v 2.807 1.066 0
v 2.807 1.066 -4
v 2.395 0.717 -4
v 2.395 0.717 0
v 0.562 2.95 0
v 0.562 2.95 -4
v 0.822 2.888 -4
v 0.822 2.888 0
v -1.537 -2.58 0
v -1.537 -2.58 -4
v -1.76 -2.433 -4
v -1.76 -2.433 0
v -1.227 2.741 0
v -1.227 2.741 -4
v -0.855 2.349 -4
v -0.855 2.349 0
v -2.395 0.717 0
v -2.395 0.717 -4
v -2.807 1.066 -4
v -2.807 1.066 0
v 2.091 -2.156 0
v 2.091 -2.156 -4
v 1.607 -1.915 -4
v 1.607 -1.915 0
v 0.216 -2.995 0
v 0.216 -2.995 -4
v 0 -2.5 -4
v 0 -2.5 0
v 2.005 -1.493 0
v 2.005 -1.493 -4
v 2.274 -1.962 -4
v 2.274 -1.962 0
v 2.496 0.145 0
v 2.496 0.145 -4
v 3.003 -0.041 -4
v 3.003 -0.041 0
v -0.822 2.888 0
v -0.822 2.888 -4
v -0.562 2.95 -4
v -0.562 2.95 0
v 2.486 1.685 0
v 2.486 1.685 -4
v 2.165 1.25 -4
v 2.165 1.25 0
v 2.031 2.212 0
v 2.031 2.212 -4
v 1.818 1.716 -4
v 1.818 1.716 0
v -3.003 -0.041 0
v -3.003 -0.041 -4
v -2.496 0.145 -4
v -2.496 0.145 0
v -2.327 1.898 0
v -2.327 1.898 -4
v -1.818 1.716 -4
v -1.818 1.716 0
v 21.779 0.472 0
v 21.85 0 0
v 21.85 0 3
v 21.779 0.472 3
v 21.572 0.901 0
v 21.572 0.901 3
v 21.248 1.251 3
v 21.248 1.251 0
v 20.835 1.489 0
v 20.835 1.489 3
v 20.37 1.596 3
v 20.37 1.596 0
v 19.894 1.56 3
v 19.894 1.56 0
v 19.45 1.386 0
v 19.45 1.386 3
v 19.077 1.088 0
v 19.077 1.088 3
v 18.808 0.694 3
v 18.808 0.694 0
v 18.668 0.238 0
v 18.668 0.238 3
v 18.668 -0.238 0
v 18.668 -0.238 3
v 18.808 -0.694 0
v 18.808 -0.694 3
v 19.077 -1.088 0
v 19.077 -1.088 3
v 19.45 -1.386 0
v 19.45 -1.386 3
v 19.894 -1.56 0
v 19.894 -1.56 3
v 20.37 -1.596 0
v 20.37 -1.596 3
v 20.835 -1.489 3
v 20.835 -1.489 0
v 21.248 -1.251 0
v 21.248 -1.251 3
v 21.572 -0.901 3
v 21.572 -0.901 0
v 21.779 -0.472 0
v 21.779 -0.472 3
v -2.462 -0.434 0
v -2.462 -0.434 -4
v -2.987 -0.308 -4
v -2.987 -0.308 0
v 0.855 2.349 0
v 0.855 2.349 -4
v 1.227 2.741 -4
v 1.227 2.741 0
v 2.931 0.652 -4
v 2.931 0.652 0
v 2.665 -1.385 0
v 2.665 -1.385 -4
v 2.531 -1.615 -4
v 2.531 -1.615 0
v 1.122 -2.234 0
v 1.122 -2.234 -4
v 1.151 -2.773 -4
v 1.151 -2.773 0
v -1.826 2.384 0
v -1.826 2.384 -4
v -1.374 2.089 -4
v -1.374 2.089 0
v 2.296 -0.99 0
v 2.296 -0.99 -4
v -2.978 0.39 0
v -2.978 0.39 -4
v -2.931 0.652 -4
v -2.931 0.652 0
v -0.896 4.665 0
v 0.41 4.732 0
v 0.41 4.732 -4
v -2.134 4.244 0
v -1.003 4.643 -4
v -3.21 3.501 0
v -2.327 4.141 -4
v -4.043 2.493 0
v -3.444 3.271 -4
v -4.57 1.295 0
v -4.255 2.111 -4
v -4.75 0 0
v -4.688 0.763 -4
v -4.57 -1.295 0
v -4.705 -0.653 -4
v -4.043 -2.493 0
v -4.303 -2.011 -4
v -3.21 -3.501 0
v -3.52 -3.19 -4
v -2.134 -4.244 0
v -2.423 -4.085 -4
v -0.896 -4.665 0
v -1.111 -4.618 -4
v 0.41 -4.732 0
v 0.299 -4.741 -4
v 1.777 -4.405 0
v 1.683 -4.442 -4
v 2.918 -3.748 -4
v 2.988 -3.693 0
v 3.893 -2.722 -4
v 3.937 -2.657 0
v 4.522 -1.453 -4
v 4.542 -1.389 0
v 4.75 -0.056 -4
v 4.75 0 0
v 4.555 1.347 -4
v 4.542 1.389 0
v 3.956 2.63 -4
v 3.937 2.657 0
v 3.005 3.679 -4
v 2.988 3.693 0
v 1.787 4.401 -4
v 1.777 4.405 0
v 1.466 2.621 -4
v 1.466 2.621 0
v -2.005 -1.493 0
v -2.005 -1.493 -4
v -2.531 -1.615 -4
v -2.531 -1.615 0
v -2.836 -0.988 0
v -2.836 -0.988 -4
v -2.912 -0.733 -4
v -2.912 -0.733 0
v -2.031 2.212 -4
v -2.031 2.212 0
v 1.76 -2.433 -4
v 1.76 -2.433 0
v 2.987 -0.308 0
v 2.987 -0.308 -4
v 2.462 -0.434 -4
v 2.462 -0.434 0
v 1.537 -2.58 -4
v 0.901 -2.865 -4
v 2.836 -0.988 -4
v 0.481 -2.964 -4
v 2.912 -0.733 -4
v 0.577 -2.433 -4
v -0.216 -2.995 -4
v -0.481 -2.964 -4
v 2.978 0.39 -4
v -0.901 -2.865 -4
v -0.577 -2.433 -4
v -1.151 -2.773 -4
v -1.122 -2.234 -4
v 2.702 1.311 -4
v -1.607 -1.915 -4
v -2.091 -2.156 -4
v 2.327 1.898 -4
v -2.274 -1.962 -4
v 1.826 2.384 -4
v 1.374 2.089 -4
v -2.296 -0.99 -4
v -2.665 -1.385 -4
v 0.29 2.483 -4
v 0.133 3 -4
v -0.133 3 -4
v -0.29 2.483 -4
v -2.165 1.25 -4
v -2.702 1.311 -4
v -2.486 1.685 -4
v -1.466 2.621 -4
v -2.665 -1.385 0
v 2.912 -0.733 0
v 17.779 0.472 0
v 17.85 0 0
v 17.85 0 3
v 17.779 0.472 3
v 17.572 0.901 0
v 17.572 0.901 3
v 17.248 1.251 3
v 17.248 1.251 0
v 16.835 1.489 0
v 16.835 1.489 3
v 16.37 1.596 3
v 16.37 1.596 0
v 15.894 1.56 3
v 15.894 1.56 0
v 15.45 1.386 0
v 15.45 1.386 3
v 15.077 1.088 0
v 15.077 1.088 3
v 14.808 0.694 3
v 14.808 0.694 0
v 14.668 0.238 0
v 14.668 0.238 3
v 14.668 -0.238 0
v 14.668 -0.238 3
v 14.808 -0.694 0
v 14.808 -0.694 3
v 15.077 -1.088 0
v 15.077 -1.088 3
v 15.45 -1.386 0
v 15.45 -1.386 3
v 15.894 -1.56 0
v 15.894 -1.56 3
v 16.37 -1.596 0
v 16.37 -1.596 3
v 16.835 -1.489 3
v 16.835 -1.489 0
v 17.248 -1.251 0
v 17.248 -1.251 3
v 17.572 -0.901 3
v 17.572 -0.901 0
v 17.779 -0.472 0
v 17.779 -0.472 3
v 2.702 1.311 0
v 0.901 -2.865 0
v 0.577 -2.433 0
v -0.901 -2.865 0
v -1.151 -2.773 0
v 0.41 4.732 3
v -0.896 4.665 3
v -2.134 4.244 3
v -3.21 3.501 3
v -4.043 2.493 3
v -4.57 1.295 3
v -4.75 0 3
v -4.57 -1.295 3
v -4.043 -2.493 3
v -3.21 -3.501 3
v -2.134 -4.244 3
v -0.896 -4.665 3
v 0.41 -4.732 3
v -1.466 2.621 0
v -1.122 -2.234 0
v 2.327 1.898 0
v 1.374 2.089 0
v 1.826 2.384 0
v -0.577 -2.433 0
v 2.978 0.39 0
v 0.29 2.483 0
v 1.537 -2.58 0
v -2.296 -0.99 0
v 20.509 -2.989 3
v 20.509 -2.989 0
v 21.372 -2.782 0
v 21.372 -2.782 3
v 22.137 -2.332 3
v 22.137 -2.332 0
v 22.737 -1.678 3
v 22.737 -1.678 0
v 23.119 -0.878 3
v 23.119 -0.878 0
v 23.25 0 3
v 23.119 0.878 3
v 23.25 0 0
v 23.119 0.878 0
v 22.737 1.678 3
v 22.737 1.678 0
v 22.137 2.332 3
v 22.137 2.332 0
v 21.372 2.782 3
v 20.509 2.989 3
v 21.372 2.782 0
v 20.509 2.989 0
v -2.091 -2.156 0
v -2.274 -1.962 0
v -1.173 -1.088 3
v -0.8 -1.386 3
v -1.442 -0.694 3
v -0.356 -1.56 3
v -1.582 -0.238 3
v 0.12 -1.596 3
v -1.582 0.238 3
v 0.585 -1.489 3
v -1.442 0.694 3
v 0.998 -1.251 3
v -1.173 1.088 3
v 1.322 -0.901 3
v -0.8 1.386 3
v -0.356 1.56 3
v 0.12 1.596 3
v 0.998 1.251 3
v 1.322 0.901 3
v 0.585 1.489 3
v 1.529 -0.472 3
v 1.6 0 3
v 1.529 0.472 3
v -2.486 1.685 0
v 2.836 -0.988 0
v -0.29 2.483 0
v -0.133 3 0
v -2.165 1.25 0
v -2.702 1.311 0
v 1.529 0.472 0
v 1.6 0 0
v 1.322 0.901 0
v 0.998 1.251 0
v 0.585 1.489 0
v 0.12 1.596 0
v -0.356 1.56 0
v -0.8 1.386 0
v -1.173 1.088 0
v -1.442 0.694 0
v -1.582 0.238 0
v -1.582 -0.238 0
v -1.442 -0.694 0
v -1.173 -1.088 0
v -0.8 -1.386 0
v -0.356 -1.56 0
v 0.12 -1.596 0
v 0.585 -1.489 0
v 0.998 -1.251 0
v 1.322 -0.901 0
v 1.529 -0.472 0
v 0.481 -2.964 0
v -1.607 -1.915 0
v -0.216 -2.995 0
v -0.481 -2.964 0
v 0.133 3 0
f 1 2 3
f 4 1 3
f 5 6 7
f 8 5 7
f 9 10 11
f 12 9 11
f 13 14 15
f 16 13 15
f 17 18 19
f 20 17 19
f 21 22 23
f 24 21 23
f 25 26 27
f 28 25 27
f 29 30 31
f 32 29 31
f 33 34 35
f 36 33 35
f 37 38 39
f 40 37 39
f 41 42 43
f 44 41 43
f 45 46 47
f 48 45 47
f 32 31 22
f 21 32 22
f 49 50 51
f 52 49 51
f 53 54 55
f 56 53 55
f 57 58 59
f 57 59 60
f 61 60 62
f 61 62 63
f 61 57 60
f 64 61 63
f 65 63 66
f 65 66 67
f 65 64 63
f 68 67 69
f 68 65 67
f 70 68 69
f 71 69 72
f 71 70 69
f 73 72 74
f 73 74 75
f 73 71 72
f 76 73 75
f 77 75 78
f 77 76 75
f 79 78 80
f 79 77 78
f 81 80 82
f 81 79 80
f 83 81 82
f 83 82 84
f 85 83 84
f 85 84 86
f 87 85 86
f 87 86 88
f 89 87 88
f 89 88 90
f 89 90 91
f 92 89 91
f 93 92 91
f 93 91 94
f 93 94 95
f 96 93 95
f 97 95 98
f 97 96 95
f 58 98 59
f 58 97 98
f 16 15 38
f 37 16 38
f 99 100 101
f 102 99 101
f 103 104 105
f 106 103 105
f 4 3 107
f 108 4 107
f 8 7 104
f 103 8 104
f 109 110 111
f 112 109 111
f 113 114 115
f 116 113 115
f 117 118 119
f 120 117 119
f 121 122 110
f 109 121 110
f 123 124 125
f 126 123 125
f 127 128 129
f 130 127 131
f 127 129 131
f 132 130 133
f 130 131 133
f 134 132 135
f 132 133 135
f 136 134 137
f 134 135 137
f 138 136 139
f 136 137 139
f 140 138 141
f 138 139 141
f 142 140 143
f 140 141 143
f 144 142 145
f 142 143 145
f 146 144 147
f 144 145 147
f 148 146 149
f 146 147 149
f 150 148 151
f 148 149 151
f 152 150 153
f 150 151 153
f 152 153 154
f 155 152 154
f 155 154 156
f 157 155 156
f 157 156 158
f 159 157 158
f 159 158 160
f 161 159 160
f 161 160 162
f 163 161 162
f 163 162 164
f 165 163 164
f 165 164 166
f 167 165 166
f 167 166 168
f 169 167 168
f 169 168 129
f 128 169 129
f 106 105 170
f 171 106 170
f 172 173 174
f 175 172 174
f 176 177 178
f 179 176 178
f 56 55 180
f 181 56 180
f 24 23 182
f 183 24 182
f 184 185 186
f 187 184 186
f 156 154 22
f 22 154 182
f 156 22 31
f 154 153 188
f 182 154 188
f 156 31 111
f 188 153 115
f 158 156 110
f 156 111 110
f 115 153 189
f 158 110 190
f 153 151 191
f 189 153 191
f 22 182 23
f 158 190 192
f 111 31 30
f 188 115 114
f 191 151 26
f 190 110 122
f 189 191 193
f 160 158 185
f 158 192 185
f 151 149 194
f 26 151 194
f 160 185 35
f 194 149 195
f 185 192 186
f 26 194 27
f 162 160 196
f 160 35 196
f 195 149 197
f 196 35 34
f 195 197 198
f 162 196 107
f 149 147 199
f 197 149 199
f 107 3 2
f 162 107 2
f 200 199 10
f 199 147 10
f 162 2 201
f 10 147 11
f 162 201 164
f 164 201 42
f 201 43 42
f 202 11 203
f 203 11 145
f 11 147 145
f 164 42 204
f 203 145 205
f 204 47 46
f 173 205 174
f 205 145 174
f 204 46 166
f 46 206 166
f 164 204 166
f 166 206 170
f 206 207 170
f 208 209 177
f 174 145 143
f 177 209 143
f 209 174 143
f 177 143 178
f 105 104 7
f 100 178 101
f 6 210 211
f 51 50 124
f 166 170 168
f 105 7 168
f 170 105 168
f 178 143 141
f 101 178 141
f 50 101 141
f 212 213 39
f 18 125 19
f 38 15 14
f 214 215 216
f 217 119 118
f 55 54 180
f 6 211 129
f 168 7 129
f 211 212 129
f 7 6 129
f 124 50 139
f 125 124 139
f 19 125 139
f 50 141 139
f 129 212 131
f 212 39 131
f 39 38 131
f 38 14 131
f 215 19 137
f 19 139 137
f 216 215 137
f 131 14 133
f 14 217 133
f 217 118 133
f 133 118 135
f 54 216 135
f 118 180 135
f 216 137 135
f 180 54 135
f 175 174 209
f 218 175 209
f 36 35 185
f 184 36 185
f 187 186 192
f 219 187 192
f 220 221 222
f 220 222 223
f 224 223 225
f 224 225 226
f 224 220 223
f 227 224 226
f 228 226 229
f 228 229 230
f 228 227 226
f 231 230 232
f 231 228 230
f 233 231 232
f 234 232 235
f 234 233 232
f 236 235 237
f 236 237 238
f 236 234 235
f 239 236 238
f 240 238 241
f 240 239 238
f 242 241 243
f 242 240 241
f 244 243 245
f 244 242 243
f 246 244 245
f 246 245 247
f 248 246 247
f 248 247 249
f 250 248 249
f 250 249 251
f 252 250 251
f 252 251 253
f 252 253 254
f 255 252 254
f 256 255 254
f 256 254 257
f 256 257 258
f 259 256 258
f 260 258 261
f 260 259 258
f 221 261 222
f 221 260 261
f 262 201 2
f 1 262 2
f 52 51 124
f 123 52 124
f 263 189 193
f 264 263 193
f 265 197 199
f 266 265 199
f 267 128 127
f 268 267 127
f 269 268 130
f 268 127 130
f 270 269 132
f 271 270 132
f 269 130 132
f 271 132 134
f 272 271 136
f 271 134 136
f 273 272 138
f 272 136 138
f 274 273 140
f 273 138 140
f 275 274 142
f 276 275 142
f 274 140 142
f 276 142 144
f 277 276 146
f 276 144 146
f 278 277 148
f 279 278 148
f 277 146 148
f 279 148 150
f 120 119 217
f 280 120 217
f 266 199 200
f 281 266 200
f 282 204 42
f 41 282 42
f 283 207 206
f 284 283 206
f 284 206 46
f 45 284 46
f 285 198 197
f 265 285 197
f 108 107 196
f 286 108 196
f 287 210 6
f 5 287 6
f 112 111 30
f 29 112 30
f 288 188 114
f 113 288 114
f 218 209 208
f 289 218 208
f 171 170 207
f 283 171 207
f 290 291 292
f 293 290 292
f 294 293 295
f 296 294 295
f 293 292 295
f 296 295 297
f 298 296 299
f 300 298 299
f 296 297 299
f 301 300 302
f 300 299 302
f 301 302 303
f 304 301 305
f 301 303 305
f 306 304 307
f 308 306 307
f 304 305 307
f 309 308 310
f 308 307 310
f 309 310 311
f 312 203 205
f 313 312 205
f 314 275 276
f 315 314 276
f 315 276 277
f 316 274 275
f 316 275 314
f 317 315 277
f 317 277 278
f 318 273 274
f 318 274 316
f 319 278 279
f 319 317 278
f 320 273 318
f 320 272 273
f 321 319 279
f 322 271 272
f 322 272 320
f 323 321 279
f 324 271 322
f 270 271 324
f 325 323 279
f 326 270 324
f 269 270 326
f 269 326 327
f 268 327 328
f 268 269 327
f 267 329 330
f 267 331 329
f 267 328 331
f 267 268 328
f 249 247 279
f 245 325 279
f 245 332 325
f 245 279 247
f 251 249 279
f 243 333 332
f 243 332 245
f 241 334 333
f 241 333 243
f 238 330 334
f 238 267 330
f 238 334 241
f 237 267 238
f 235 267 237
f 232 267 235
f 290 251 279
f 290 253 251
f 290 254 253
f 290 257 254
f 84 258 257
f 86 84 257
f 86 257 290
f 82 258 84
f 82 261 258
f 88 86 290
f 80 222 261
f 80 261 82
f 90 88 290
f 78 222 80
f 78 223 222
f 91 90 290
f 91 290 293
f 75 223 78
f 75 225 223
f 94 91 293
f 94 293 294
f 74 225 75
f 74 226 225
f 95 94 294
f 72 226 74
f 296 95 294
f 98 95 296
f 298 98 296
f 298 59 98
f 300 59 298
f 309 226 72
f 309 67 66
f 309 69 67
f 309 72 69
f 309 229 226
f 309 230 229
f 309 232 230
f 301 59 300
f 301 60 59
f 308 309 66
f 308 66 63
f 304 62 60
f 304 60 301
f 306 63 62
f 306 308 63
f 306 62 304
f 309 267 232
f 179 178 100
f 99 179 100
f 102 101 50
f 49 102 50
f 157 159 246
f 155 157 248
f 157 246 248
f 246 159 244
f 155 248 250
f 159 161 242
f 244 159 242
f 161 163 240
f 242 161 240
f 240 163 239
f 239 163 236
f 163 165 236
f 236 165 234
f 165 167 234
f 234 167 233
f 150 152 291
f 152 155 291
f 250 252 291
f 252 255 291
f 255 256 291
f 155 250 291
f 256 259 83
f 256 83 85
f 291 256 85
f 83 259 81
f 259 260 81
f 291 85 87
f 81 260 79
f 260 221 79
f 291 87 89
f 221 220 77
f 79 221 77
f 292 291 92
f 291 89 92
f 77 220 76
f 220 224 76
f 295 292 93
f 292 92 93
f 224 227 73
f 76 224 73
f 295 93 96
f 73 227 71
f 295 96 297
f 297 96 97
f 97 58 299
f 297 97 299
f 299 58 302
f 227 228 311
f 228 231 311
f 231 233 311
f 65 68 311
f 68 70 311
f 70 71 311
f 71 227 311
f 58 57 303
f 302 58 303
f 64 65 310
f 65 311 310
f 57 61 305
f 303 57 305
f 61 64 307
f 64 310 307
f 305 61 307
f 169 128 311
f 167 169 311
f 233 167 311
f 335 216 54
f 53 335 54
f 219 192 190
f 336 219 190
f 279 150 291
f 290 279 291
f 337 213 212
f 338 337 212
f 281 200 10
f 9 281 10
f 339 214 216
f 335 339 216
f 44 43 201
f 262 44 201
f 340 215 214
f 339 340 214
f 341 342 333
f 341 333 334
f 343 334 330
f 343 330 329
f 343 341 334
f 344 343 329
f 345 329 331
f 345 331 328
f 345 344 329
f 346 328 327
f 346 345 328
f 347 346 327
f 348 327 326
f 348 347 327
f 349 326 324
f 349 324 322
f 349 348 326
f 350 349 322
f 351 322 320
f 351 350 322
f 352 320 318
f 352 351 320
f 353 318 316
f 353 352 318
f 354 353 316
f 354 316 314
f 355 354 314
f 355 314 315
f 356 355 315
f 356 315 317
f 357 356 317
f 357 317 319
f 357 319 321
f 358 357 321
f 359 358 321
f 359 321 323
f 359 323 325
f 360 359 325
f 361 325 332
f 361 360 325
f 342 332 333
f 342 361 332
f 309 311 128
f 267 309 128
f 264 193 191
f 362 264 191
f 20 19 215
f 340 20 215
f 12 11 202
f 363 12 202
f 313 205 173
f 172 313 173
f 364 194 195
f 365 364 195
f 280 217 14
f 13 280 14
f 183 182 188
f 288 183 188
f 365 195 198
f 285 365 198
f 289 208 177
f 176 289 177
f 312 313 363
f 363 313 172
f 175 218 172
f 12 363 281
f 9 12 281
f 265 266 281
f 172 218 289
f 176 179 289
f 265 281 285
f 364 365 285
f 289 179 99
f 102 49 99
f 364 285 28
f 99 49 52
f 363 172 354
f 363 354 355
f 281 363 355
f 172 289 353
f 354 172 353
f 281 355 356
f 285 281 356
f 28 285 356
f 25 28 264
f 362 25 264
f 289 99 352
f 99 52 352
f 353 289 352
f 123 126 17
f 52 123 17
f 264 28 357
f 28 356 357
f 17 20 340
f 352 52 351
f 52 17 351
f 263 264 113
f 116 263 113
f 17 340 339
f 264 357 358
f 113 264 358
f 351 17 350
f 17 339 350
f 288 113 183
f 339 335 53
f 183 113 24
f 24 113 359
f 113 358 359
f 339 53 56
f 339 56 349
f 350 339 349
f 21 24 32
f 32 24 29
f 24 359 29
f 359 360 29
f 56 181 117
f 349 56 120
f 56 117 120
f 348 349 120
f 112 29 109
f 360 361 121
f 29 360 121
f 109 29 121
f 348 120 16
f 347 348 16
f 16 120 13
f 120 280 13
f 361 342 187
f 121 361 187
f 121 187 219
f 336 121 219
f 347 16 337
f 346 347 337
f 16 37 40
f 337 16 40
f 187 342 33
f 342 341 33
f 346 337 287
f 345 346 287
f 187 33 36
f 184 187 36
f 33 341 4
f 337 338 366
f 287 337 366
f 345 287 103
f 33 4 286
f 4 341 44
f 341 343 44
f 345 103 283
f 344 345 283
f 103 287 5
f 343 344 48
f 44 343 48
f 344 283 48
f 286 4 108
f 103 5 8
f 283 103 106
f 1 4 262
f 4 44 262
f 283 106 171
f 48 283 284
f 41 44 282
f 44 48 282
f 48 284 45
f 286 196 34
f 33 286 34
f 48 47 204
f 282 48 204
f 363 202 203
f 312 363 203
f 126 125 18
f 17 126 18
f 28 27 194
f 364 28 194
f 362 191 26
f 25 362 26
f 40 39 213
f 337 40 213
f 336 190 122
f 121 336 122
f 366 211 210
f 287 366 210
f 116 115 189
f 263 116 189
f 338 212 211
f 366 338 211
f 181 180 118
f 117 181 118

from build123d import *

# Parameters (mm, degrees)
SKETCH1_R           = 1.6
SKETCH1_R_2         = 2.5
BOSS_EXTRUDE1_DEPTH = 3
BOSS_EXTRUDE2_START = -4
SKETCH1_3_R         = 4.75
SKETCH1_3_R_2       = 2.5
BOSS_EXTRUDE2_DEPTH = 4
CUT_EXTRUDE1_DEPTH  = 4
BOSS_EXTRUDE3_START = -3
SKETCH3_R           = 2.5
SKETCH3_R_2         = 1.6
BOSS_EXTRUDE3_DEPTH = 3


with BuildPart() as part:
    # Sketch1 → Boss-Extrude1 (new body)
    with BuildSketch(Plane.XY):
        with BuildLine():
            Line((20.509259259, 2.988776445), (0.410493827, 4.732229371))
            ThreePointArc((0.410493827, 4.732229371), (-4.75, 0), (0.410493827, -4.732229371))
            Line((0.410493827, -4.732229371), (20.509259259, -2.988776445))
            ThreePointArc((20.509259259, -2.988776445), (23.25, 0), (20.509259259, 2.988776445))
        make_face()
        with Locations((16.25, 0)):
            Circle(SKETCH1_R, mode=Mode.SUBTRACT)
        Circle(SKETCH1_R_2, mode=Mode.SUBTRACT)
        with Locations((20.25, 0)):
            Circle(SKETCH1_R, mode=Mode.SUBTRACT)
    extrude(amount=BOSS_EXTRUDE1_DEPTH)

    # Sketch1<3> → Boss-Extrude2 (add)
    with BuildSketch(Plane.XY.offset(BOSS_EXTRUDE2_START)):
        with Locations(Location((0, 0, 0), (0, 0, 85.042328816))):
            Circle(SKETCH1_3_R)
        Circle(SKETCH1_3_R_2, mode=Mode.SUBTRACT)
    extrude(amount=BOSS_EXTRUDE2_DEPTH)

    # Sketch2 → Cut-Extrude1 (cut)
    with BuildSketch(Plane(origin=(0, 0, -4), x_dir=(-1, 0, 0), z_dir=(0, 0, -1))):
        Polygon((-0.133339862, 3), (-0.290232285, 2.483095894), (-0.562101943, 2.9498849), (-0.821593281, 2.888384323), (-0.855050358, 2.349231552), (-1.227240688, 2.740740742), (-1.465554394, 2.6210551), (-1.373772445, 2.088719529), (-1.826218569, 2.383842541), (-2.03050709, 2.212424118), (-1.818434104, 1.715604095), (-2.326744534, 1.898430771), (-2.485994623, 1.684520779), (-2.165063509, 1.25), (-2.701835099, 1.310674107), (-2.807461542, 1.065804489), (-2.394973781, 0.717008082), (-2.931269035, 0.652258663), (-2.977577483, 0.389630403), (-2.495770396, 0.145362072), (-3.002677498, -0.041320215), (-2.987171451, -0.307548759), (-2.462019383, -0.434120444), (-2.91221084, -0.732671509), (-2.835726233, -0.988147888), (-2.295540267, -0.990199415), (-2.664746142, -1.384524292), (-2.53140628, -1.615475708), (-2.005307982, -1.492896479), (-2.27362429, -1.961737012), (-2.090617559, -2.155712815), (-1.606969024, -1.915111108), (-1.759930764, -2.433191983), (-1.537123105, -2.579734886), (-1.121997951, -2.234081601), (-1.151358915, -2.773472944), (-0.900761945, -2.864682781), (-0.576539677, -2.432612176), (-0.480717008, -2.96423526), (-0.215840477, -2.995194886), (0, -2.5), (0.215840477, -2.995194886), (0.480717008, -2.96423526), (0.576539677, -2.432612176), (0.900761945, -2.864682781), (1.151358915, -2.773472944), (1.121997951, -2.234081601), (1.537123105, -2.579734886), (1.759930764, -2.433191983), (1.606969024, -1.915111108), (2.090617559, -2.155712815), (2.27362429, -1.961737012), (2.005307982, -1.492896479), (2.53140628, -1.615475708), (2.664746142, -1.384524292), (2.295540267, -0.990199415), (2.835726233, -0.988147888), (2.91221084, -0.732671509), (2.462019383, -0.434120444), (2.987171451, -0.307548759), (3.002677498, -0.041320215), (2.495770396, 0.145362072), (2.977577483, 0.389630403), (2.931269035, 0.652258663), (2.394973781, 0.717008082), (2.807461542, 1.065804489), (2.701835099, 1.310674107), (2.165063509, 1.25), (2.485994623, 1.684520779), (2.326744534, 1.898430771), (1.818434104, 1.715604095), (2.03050709, 2.212424118), (1.826218569, 2.383842541), (1.373772445, 2.088719529), (1.465554394, 2.6210551), (1.227240688, 2.740740742), (0.855050358, 2.349231552), (0.821593281, 2.888384323), (0.562101943, 2.9498849), (0.290232285, 2.483095894), (0.133339862, 3), align=None)
    extrude(amount=-CUT_EXTRUDE1_DEPTH, mode=Mode.SUBTRACT)

    # Sketch3 → Boss-Extrude3 (add)
    with BuildSketch(Plane.XY.offset(3).offset(BOSS_EXTRUDE3_START)):
        Circle(SKETCH3_R)
        Circle(SKETCH3_R_2, mode=Mode.SUBTRACT)
    extrude(amount=BOSS_EXTRUDE3_DEPTH)


solid = part.part
